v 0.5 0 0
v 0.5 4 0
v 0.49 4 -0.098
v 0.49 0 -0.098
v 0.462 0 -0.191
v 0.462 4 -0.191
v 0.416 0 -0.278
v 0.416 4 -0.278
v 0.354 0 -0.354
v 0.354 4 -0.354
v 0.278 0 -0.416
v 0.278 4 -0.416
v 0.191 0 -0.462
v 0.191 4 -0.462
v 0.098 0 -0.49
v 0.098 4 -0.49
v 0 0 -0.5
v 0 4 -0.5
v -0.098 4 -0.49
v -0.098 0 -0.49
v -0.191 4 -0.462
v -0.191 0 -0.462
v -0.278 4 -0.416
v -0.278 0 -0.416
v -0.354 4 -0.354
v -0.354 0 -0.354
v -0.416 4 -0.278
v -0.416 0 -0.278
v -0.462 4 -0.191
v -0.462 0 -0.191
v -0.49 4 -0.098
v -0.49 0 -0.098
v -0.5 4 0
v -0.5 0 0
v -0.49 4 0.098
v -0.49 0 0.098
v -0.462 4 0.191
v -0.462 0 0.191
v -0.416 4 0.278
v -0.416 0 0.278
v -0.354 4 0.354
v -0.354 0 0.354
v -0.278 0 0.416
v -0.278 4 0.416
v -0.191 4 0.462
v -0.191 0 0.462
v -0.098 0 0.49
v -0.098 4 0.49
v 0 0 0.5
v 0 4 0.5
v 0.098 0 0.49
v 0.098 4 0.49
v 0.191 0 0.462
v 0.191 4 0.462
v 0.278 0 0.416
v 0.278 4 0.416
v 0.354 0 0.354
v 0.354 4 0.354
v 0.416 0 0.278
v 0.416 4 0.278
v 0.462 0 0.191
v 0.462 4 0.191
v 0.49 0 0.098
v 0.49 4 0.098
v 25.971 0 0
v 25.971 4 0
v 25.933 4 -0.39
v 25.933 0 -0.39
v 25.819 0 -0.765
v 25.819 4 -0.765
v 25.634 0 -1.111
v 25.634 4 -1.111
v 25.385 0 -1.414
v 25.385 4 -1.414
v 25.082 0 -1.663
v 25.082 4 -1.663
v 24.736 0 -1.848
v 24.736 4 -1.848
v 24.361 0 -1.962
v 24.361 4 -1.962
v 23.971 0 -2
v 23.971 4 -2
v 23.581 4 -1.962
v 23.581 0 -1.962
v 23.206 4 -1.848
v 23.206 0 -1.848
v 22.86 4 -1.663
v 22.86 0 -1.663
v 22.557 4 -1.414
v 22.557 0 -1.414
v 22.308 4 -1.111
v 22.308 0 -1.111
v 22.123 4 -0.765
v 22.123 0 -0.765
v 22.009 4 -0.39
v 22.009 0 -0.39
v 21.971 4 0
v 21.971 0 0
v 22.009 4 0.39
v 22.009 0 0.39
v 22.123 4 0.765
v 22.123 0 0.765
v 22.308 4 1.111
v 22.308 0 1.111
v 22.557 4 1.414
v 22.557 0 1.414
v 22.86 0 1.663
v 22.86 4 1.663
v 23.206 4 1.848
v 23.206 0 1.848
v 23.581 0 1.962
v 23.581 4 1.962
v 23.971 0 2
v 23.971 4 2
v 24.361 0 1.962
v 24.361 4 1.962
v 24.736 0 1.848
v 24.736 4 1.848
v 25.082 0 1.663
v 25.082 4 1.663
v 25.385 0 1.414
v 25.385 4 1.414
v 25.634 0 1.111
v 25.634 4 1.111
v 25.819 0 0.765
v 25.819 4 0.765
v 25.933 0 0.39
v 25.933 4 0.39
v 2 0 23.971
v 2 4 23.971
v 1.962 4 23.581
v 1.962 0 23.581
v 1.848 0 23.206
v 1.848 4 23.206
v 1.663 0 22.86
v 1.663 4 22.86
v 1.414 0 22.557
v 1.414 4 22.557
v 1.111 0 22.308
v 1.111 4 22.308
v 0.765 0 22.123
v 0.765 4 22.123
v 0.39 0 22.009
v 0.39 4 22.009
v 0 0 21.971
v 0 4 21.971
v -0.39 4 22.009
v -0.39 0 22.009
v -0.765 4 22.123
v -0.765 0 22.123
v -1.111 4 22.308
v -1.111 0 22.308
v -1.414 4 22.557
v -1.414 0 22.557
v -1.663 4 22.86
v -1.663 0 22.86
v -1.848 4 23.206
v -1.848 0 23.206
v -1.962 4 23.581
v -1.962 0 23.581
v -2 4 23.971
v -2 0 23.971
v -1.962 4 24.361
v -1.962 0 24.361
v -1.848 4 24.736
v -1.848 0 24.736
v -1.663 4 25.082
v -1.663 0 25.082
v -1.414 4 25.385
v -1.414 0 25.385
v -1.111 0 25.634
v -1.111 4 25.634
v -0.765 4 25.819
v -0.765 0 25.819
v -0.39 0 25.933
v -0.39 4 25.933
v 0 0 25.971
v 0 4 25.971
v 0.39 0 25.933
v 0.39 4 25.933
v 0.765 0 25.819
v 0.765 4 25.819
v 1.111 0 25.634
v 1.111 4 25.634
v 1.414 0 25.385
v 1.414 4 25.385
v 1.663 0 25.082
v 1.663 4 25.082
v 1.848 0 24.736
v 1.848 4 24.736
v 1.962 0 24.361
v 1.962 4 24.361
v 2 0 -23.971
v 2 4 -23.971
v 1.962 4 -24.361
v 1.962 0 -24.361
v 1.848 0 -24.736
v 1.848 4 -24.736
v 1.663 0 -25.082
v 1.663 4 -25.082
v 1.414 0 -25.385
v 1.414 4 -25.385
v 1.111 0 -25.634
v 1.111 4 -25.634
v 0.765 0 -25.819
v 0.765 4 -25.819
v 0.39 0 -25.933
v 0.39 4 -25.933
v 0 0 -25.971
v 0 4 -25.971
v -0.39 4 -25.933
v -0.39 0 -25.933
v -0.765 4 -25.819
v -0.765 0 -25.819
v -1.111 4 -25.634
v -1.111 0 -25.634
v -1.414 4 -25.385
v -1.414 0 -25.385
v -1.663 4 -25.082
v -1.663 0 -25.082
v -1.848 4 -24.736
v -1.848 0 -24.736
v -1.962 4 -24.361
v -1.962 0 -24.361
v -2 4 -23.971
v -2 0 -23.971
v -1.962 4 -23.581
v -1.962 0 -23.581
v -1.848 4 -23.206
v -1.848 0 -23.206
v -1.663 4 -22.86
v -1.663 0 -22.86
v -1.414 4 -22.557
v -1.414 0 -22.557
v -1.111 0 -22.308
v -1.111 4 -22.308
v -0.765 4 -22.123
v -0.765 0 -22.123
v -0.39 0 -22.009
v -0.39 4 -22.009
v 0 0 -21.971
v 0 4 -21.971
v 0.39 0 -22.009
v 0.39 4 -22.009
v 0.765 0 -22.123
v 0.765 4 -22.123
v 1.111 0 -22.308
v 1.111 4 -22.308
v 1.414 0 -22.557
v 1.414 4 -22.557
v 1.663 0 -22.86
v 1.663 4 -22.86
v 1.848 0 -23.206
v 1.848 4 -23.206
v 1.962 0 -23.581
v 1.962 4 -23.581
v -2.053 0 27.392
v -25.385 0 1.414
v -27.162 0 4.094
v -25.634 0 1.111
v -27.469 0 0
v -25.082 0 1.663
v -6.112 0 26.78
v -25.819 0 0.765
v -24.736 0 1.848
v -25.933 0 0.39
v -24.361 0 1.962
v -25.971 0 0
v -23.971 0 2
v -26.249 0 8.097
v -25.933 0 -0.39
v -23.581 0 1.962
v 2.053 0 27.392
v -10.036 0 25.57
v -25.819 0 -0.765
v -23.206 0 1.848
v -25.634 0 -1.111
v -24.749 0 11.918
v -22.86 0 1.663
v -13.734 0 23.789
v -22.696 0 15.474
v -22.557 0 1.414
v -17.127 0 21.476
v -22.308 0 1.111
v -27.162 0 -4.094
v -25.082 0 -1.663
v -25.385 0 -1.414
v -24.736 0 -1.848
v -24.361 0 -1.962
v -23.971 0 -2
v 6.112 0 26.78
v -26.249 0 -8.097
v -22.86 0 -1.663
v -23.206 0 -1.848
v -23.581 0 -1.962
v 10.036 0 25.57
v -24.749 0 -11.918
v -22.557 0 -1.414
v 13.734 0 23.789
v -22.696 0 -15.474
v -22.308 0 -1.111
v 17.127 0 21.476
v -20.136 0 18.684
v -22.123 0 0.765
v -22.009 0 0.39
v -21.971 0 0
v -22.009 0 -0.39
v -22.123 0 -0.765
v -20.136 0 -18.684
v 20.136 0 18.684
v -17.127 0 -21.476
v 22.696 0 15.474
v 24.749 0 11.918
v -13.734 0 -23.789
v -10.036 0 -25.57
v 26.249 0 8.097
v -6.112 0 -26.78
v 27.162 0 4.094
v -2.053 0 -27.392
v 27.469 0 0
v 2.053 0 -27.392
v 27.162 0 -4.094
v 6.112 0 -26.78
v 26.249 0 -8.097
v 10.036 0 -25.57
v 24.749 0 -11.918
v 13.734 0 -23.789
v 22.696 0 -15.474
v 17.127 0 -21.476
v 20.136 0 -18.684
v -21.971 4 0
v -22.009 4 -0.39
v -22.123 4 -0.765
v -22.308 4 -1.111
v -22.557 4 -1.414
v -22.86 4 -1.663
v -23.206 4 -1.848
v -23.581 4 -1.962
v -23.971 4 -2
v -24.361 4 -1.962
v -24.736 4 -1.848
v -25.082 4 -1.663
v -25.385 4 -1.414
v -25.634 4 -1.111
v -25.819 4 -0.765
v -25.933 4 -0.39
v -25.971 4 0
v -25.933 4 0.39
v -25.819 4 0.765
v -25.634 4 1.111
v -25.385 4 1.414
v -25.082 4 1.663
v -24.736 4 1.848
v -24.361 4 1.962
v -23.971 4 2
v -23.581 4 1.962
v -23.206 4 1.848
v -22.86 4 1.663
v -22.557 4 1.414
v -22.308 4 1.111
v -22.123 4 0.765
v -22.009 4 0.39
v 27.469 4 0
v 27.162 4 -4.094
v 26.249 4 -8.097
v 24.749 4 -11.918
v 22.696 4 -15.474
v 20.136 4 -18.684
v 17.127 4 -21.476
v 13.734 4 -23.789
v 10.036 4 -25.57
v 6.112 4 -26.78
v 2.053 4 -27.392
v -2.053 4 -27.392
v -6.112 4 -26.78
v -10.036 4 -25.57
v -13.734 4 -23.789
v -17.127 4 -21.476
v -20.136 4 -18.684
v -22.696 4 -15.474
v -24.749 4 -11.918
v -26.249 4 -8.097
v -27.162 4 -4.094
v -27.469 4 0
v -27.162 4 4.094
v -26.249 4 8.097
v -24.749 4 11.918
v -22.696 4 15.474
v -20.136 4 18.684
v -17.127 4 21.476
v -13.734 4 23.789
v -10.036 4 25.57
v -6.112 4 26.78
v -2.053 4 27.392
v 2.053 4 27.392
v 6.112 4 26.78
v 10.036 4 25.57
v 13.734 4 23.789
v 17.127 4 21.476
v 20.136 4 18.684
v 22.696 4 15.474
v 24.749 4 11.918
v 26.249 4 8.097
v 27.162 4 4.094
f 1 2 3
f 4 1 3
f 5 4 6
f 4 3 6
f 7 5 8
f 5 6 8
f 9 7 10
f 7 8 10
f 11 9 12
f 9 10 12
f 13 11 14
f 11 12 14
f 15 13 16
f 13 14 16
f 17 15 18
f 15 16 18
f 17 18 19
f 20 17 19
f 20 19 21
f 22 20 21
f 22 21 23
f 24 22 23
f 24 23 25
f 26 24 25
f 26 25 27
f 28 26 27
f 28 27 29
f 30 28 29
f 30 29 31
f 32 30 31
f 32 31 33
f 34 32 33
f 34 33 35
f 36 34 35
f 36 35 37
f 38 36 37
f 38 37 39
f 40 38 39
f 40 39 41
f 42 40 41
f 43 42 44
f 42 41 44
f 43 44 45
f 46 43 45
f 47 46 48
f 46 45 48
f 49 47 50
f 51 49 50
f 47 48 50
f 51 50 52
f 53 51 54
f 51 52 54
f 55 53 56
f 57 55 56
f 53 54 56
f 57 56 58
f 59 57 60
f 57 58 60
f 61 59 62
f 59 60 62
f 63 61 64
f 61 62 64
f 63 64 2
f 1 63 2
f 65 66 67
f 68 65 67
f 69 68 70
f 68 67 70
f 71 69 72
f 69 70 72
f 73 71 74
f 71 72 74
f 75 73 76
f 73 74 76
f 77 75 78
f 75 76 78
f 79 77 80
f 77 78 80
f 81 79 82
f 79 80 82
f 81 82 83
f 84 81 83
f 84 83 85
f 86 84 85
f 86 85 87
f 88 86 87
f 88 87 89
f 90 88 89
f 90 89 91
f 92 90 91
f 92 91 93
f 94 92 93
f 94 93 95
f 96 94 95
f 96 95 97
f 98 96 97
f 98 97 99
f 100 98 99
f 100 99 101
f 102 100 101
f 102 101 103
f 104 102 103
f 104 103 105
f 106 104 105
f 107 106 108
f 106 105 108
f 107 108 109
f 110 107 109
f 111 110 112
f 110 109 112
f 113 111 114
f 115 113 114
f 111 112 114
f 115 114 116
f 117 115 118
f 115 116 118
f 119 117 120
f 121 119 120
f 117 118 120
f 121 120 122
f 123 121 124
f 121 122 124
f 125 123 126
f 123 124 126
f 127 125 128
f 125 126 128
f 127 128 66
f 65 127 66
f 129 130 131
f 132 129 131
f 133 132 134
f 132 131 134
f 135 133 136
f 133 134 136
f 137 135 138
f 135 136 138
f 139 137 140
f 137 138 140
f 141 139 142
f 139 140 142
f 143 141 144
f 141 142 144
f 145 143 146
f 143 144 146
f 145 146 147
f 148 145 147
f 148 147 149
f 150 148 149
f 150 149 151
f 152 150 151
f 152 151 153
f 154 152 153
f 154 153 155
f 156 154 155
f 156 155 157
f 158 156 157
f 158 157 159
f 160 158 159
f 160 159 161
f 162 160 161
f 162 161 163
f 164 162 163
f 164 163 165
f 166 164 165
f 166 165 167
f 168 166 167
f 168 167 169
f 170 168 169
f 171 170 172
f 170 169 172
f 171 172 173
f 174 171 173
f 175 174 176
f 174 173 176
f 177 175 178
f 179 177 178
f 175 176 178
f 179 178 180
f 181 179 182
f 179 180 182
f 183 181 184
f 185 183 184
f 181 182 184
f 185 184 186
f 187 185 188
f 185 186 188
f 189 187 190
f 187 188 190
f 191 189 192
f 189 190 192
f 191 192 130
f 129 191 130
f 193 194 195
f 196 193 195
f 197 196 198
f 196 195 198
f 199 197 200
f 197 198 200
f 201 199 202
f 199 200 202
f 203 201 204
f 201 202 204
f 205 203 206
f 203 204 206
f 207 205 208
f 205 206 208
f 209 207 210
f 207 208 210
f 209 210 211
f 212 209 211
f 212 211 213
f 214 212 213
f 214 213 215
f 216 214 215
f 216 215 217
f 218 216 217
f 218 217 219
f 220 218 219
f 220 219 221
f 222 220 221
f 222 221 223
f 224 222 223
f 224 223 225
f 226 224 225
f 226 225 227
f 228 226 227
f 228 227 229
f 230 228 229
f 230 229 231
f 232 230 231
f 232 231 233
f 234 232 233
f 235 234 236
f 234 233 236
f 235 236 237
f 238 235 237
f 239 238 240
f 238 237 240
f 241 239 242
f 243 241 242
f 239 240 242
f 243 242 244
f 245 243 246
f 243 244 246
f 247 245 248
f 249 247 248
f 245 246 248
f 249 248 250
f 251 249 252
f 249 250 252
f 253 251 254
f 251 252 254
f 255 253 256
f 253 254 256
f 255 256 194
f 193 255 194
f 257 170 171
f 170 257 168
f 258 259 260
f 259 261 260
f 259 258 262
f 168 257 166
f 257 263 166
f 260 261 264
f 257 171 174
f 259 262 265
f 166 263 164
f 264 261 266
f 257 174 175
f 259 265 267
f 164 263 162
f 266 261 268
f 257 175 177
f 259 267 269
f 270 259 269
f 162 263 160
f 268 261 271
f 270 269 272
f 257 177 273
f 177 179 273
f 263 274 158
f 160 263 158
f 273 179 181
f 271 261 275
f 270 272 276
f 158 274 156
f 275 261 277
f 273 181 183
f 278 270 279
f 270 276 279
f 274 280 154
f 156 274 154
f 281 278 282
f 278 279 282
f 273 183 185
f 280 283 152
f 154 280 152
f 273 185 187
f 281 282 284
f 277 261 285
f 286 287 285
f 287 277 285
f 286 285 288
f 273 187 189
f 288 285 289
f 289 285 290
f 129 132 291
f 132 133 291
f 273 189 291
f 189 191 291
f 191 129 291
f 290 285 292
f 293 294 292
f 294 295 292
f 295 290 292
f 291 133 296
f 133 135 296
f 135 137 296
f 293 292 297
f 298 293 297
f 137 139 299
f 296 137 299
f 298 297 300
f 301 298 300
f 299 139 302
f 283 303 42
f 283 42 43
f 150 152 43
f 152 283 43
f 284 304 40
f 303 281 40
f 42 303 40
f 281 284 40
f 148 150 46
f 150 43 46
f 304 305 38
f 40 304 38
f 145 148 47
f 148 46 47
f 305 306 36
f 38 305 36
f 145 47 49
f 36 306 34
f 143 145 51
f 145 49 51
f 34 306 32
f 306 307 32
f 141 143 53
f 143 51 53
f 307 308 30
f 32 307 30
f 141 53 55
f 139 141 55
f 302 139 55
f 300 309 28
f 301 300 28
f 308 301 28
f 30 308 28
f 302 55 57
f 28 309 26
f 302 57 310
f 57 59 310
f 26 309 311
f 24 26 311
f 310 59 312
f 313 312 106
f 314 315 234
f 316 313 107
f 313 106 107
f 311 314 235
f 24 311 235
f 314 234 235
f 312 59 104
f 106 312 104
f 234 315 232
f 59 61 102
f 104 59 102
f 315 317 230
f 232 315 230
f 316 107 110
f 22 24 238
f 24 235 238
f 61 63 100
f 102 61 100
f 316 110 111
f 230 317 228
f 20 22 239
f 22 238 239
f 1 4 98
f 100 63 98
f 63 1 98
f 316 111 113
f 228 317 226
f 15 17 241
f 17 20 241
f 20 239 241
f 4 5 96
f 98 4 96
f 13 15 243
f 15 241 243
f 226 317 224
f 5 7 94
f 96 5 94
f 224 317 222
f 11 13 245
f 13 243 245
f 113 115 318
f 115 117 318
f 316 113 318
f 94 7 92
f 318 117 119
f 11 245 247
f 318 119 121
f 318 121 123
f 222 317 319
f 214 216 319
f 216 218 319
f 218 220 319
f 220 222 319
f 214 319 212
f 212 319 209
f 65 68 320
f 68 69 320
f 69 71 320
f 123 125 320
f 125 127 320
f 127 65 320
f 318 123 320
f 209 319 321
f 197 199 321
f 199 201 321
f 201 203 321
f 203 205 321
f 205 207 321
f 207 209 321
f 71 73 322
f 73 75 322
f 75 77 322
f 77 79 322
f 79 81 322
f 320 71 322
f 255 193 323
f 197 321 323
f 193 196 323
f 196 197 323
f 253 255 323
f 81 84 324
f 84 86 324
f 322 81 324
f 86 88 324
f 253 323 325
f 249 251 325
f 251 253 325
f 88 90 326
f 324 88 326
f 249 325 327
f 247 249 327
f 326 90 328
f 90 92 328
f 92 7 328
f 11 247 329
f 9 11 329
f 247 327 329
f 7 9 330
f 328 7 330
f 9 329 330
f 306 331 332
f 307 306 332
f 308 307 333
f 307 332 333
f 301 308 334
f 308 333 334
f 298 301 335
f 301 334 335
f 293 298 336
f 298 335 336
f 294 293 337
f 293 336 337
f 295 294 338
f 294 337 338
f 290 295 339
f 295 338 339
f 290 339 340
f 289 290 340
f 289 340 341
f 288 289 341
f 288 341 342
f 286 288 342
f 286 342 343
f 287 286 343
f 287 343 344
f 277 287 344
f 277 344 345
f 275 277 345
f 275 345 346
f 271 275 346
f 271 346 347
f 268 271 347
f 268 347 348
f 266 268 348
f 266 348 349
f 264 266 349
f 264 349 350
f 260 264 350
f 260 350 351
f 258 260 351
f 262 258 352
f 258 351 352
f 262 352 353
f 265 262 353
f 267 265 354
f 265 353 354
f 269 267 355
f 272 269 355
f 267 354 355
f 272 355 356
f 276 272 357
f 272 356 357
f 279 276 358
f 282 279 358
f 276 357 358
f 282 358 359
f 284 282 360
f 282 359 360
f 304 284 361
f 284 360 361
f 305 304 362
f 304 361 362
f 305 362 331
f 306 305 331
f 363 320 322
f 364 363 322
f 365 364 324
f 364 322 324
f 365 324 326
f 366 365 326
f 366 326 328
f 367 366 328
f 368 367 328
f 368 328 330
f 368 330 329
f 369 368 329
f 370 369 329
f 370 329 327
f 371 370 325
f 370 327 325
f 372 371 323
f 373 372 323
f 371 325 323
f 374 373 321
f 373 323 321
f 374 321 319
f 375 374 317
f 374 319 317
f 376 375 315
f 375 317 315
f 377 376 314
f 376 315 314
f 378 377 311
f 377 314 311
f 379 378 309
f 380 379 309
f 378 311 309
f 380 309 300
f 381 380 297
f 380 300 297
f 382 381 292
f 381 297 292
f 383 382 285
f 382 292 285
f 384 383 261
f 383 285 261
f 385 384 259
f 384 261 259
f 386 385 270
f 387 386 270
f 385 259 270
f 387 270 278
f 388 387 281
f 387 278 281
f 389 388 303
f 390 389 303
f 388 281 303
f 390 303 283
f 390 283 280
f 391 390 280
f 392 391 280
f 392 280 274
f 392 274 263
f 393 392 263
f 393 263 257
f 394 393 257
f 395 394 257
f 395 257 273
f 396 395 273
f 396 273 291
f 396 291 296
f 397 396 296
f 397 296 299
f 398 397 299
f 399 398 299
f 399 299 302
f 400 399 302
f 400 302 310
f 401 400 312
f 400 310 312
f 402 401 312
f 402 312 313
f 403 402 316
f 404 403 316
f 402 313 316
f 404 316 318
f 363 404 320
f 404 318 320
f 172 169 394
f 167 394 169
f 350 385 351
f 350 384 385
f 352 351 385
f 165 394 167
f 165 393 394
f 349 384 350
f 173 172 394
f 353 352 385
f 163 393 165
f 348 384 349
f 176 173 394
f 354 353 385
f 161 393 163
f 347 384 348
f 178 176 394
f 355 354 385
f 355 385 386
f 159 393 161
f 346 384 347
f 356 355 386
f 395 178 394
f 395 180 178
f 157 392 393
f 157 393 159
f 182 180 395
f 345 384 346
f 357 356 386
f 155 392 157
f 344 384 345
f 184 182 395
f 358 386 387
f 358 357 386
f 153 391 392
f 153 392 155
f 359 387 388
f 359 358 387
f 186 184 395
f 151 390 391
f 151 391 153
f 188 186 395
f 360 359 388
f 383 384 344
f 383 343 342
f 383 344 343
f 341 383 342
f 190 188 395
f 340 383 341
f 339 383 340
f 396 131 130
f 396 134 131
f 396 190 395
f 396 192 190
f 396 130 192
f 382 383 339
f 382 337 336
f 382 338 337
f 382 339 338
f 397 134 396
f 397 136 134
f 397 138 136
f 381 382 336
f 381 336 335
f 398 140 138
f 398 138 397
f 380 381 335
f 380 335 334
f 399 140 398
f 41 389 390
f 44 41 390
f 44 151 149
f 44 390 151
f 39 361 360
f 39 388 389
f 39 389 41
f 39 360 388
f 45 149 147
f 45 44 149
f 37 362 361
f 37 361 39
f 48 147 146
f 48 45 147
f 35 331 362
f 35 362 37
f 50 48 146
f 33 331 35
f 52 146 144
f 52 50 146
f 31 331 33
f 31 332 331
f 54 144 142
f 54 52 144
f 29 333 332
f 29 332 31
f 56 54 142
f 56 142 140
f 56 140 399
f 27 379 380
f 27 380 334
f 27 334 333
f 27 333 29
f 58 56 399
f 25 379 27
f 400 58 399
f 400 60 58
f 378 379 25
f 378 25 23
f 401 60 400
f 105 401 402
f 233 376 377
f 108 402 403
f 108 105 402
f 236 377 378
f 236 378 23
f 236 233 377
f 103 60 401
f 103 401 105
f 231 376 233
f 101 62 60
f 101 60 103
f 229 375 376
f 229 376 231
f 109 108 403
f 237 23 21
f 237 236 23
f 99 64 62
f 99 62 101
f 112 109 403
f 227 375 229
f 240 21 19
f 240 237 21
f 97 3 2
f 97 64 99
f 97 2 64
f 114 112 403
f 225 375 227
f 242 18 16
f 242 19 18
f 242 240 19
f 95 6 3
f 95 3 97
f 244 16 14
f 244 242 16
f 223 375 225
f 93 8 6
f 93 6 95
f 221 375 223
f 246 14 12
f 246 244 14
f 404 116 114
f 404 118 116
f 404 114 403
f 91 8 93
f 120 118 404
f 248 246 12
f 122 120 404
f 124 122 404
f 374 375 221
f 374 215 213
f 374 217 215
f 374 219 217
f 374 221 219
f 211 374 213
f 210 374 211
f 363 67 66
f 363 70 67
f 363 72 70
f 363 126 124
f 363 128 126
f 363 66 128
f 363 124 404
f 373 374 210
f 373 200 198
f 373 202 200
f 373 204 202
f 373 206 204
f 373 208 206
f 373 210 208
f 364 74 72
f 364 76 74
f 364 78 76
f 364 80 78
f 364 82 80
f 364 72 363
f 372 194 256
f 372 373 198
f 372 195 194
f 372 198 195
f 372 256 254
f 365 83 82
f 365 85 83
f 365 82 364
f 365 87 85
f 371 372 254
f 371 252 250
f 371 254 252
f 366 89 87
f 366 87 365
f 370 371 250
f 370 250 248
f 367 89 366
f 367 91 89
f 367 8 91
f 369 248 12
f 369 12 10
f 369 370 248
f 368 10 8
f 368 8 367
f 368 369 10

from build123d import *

# Parameters (mm, degrees)
SKETCH2_R           = 27.469
BOSS_EXTRUDE1_DEPTH = 4
SKETCH3_R           = 2
CUT_EXTRUDE1_DEPTH  = 5
SKETCH4_R           = 0.5
CUT_EXTRUDE2_DEPTH  = 6


with BuildPart() as part:
    # Sketch2 → Boss-Extrude1 (new body)
    with BuildSketch(Plane(origin=(0, 0, 0), x_dir=(1, 0, 0), z_dir=(0, 1, 0))):
        Circle(SKETCH2_R)
    extrude(amount=BOSS_EXTRUDE1_DEPTH)

    # Sketch3 → Cut-Extrude1 (cut, through all)
    with BuildSketch(Plane(origin=(0, 4, 0), x_dir=(1, 0, 0), z_dir=(0, 1, 0))):
        with Locations((-23.971, 0)):
            Circle(SKETCH3_R)
        with Locations((0, 23.971)):
            Circle(SKETCH3_R)
        with Locations((23.971, 0)):
            Circle(SKETCH3_R)
        with Locations((0, -23.971)):
            Circle(SKETCH3_R)
    extrude(amount=-CUT_EXTRUDE1_DEPTH, mode=Mode.SUBTRACT)

    # Sketch4 → Cut-Extrude2 (cut, through all)
    with BuildSketch(Plane(origin=(0, 5, 0), x_dir=(1, 0, 0), z_dir=(0, 1, 0))):
        Circle(SKETCH4_R)
    extrude(amount=-CUT_EXTRUDE2_DEPTH, mode=Mode.SUBTRACT)


solid = part.part
